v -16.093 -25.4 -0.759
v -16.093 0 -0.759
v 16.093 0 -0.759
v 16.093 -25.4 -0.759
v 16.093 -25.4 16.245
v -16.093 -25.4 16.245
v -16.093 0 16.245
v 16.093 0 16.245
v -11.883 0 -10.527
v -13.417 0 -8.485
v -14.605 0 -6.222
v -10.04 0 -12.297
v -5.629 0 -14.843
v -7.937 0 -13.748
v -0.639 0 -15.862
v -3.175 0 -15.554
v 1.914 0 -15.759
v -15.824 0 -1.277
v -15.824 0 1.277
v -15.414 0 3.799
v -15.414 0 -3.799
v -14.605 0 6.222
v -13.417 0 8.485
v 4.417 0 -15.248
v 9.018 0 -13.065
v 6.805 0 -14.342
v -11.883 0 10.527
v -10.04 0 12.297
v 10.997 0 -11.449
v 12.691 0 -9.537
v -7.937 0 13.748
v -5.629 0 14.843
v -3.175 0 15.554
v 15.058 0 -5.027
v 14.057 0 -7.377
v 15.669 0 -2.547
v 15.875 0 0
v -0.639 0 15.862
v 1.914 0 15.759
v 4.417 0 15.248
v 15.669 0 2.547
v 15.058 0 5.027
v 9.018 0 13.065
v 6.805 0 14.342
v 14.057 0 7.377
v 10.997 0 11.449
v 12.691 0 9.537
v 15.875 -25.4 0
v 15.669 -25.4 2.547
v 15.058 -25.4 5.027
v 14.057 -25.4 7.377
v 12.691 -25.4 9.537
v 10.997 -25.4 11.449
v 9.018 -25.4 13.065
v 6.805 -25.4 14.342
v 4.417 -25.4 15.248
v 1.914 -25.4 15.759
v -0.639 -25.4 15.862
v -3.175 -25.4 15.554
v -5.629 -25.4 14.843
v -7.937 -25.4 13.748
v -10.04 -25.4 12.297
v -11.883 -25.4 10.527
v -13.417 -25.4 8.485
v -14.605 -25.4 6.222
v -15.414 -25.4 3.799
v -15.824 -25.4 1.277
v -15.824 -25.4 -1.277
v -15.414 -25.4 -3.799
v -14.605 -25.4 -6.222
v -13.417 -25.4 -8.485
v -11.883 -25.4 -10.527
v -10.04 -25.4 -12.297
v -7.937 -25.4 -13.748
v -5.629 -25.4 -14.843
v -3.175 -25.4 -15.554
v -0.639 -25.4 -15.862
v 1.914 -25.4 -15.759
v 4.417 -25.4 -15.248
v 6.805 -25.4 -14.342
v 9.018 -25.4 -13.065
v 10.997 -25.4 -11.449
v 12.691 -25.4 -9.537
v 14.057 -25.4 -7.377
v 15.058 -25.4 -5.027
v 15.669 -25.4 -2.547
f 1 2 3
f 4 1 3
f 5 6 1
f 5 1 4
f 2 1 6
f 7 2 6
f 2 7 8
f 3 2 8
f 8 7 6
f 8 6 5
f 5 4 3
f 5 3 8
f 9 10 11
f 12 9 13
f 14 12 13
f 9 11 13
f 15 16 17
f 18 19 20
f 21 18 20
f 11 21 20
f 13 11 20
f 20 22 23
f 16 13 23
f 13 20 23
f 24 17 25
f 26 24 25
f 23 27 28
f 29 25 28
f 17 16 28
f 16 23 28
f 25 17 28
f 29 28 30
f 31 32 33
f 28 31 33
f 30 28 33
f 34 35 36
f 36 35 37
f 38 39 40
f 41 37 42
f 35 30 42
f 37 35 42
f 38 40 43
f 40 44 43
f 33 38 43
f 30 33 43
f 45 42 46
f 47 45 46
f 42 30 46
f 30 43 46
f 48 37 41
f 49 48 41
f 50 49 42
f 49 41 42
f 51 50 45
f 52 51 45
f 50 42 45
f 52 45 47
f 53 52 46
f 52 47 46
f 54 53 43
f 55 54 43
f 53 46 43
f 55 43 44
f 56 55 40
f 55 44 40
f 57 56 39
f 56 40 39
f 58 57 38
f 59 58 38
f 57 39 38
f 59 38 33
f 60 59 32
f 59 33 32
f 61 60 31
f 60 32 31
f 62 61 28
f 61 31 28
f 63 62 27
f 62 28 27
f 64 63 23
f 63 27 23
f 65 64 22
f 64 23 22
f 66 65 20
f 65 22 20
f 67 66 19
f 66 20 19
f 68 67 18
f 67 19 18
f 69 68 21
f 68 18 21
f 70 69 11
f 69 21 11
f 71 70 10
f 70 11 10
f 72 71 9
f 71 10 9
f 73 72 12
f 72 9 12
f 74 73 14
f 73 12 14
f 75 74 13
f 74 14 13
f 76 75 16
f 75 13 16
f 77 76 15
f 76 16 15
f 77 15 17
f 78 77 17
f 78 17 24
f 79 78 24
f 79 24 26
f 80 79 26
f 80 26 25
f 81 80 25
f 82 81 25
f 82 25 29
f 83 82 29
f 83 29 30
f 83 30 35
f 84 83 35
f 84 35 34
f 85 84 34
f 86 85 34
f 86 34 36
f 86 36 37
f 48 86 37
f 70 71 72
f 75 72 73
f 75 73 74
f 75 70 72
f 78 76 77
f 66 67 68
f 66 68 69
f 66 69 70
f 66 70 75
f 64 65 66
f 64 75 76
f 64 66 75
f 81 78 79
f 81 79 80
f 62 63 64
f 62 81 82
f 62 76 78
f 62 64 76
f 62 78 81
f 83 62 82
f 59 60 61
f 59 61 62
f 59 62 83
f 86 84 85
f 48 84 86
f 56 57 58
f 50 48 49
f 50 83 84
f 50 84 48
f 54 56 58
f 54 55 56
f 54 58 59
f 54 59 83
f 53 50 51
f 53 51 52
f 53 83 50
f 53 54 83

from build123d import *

# Parameters (mm, degrees)
F0_R     = 15.875
F2_DEPTH = 25.4
F1_W     = 32.1861840785
F1_H     = 17.0040223747


with BuildPart() as f2:
    # F0 (on Front) → F2 (new body)
    with BuildSketch(Plane.XZ):
        Circle(F0_R)
    extrude(amount=F2_DEPTH)


with BuildPart() as f2b:
    # F1 (on Front) → F2, piece 2 (new body)
    with BuildSketch(Plane.XZ):
        with Locations((0, 7.7429031953)):
            Rectangle(F1_W, F1_H)
    extrude(amount=F2_DEPTH)


solid = Compound([f2.part, f2b.part])
